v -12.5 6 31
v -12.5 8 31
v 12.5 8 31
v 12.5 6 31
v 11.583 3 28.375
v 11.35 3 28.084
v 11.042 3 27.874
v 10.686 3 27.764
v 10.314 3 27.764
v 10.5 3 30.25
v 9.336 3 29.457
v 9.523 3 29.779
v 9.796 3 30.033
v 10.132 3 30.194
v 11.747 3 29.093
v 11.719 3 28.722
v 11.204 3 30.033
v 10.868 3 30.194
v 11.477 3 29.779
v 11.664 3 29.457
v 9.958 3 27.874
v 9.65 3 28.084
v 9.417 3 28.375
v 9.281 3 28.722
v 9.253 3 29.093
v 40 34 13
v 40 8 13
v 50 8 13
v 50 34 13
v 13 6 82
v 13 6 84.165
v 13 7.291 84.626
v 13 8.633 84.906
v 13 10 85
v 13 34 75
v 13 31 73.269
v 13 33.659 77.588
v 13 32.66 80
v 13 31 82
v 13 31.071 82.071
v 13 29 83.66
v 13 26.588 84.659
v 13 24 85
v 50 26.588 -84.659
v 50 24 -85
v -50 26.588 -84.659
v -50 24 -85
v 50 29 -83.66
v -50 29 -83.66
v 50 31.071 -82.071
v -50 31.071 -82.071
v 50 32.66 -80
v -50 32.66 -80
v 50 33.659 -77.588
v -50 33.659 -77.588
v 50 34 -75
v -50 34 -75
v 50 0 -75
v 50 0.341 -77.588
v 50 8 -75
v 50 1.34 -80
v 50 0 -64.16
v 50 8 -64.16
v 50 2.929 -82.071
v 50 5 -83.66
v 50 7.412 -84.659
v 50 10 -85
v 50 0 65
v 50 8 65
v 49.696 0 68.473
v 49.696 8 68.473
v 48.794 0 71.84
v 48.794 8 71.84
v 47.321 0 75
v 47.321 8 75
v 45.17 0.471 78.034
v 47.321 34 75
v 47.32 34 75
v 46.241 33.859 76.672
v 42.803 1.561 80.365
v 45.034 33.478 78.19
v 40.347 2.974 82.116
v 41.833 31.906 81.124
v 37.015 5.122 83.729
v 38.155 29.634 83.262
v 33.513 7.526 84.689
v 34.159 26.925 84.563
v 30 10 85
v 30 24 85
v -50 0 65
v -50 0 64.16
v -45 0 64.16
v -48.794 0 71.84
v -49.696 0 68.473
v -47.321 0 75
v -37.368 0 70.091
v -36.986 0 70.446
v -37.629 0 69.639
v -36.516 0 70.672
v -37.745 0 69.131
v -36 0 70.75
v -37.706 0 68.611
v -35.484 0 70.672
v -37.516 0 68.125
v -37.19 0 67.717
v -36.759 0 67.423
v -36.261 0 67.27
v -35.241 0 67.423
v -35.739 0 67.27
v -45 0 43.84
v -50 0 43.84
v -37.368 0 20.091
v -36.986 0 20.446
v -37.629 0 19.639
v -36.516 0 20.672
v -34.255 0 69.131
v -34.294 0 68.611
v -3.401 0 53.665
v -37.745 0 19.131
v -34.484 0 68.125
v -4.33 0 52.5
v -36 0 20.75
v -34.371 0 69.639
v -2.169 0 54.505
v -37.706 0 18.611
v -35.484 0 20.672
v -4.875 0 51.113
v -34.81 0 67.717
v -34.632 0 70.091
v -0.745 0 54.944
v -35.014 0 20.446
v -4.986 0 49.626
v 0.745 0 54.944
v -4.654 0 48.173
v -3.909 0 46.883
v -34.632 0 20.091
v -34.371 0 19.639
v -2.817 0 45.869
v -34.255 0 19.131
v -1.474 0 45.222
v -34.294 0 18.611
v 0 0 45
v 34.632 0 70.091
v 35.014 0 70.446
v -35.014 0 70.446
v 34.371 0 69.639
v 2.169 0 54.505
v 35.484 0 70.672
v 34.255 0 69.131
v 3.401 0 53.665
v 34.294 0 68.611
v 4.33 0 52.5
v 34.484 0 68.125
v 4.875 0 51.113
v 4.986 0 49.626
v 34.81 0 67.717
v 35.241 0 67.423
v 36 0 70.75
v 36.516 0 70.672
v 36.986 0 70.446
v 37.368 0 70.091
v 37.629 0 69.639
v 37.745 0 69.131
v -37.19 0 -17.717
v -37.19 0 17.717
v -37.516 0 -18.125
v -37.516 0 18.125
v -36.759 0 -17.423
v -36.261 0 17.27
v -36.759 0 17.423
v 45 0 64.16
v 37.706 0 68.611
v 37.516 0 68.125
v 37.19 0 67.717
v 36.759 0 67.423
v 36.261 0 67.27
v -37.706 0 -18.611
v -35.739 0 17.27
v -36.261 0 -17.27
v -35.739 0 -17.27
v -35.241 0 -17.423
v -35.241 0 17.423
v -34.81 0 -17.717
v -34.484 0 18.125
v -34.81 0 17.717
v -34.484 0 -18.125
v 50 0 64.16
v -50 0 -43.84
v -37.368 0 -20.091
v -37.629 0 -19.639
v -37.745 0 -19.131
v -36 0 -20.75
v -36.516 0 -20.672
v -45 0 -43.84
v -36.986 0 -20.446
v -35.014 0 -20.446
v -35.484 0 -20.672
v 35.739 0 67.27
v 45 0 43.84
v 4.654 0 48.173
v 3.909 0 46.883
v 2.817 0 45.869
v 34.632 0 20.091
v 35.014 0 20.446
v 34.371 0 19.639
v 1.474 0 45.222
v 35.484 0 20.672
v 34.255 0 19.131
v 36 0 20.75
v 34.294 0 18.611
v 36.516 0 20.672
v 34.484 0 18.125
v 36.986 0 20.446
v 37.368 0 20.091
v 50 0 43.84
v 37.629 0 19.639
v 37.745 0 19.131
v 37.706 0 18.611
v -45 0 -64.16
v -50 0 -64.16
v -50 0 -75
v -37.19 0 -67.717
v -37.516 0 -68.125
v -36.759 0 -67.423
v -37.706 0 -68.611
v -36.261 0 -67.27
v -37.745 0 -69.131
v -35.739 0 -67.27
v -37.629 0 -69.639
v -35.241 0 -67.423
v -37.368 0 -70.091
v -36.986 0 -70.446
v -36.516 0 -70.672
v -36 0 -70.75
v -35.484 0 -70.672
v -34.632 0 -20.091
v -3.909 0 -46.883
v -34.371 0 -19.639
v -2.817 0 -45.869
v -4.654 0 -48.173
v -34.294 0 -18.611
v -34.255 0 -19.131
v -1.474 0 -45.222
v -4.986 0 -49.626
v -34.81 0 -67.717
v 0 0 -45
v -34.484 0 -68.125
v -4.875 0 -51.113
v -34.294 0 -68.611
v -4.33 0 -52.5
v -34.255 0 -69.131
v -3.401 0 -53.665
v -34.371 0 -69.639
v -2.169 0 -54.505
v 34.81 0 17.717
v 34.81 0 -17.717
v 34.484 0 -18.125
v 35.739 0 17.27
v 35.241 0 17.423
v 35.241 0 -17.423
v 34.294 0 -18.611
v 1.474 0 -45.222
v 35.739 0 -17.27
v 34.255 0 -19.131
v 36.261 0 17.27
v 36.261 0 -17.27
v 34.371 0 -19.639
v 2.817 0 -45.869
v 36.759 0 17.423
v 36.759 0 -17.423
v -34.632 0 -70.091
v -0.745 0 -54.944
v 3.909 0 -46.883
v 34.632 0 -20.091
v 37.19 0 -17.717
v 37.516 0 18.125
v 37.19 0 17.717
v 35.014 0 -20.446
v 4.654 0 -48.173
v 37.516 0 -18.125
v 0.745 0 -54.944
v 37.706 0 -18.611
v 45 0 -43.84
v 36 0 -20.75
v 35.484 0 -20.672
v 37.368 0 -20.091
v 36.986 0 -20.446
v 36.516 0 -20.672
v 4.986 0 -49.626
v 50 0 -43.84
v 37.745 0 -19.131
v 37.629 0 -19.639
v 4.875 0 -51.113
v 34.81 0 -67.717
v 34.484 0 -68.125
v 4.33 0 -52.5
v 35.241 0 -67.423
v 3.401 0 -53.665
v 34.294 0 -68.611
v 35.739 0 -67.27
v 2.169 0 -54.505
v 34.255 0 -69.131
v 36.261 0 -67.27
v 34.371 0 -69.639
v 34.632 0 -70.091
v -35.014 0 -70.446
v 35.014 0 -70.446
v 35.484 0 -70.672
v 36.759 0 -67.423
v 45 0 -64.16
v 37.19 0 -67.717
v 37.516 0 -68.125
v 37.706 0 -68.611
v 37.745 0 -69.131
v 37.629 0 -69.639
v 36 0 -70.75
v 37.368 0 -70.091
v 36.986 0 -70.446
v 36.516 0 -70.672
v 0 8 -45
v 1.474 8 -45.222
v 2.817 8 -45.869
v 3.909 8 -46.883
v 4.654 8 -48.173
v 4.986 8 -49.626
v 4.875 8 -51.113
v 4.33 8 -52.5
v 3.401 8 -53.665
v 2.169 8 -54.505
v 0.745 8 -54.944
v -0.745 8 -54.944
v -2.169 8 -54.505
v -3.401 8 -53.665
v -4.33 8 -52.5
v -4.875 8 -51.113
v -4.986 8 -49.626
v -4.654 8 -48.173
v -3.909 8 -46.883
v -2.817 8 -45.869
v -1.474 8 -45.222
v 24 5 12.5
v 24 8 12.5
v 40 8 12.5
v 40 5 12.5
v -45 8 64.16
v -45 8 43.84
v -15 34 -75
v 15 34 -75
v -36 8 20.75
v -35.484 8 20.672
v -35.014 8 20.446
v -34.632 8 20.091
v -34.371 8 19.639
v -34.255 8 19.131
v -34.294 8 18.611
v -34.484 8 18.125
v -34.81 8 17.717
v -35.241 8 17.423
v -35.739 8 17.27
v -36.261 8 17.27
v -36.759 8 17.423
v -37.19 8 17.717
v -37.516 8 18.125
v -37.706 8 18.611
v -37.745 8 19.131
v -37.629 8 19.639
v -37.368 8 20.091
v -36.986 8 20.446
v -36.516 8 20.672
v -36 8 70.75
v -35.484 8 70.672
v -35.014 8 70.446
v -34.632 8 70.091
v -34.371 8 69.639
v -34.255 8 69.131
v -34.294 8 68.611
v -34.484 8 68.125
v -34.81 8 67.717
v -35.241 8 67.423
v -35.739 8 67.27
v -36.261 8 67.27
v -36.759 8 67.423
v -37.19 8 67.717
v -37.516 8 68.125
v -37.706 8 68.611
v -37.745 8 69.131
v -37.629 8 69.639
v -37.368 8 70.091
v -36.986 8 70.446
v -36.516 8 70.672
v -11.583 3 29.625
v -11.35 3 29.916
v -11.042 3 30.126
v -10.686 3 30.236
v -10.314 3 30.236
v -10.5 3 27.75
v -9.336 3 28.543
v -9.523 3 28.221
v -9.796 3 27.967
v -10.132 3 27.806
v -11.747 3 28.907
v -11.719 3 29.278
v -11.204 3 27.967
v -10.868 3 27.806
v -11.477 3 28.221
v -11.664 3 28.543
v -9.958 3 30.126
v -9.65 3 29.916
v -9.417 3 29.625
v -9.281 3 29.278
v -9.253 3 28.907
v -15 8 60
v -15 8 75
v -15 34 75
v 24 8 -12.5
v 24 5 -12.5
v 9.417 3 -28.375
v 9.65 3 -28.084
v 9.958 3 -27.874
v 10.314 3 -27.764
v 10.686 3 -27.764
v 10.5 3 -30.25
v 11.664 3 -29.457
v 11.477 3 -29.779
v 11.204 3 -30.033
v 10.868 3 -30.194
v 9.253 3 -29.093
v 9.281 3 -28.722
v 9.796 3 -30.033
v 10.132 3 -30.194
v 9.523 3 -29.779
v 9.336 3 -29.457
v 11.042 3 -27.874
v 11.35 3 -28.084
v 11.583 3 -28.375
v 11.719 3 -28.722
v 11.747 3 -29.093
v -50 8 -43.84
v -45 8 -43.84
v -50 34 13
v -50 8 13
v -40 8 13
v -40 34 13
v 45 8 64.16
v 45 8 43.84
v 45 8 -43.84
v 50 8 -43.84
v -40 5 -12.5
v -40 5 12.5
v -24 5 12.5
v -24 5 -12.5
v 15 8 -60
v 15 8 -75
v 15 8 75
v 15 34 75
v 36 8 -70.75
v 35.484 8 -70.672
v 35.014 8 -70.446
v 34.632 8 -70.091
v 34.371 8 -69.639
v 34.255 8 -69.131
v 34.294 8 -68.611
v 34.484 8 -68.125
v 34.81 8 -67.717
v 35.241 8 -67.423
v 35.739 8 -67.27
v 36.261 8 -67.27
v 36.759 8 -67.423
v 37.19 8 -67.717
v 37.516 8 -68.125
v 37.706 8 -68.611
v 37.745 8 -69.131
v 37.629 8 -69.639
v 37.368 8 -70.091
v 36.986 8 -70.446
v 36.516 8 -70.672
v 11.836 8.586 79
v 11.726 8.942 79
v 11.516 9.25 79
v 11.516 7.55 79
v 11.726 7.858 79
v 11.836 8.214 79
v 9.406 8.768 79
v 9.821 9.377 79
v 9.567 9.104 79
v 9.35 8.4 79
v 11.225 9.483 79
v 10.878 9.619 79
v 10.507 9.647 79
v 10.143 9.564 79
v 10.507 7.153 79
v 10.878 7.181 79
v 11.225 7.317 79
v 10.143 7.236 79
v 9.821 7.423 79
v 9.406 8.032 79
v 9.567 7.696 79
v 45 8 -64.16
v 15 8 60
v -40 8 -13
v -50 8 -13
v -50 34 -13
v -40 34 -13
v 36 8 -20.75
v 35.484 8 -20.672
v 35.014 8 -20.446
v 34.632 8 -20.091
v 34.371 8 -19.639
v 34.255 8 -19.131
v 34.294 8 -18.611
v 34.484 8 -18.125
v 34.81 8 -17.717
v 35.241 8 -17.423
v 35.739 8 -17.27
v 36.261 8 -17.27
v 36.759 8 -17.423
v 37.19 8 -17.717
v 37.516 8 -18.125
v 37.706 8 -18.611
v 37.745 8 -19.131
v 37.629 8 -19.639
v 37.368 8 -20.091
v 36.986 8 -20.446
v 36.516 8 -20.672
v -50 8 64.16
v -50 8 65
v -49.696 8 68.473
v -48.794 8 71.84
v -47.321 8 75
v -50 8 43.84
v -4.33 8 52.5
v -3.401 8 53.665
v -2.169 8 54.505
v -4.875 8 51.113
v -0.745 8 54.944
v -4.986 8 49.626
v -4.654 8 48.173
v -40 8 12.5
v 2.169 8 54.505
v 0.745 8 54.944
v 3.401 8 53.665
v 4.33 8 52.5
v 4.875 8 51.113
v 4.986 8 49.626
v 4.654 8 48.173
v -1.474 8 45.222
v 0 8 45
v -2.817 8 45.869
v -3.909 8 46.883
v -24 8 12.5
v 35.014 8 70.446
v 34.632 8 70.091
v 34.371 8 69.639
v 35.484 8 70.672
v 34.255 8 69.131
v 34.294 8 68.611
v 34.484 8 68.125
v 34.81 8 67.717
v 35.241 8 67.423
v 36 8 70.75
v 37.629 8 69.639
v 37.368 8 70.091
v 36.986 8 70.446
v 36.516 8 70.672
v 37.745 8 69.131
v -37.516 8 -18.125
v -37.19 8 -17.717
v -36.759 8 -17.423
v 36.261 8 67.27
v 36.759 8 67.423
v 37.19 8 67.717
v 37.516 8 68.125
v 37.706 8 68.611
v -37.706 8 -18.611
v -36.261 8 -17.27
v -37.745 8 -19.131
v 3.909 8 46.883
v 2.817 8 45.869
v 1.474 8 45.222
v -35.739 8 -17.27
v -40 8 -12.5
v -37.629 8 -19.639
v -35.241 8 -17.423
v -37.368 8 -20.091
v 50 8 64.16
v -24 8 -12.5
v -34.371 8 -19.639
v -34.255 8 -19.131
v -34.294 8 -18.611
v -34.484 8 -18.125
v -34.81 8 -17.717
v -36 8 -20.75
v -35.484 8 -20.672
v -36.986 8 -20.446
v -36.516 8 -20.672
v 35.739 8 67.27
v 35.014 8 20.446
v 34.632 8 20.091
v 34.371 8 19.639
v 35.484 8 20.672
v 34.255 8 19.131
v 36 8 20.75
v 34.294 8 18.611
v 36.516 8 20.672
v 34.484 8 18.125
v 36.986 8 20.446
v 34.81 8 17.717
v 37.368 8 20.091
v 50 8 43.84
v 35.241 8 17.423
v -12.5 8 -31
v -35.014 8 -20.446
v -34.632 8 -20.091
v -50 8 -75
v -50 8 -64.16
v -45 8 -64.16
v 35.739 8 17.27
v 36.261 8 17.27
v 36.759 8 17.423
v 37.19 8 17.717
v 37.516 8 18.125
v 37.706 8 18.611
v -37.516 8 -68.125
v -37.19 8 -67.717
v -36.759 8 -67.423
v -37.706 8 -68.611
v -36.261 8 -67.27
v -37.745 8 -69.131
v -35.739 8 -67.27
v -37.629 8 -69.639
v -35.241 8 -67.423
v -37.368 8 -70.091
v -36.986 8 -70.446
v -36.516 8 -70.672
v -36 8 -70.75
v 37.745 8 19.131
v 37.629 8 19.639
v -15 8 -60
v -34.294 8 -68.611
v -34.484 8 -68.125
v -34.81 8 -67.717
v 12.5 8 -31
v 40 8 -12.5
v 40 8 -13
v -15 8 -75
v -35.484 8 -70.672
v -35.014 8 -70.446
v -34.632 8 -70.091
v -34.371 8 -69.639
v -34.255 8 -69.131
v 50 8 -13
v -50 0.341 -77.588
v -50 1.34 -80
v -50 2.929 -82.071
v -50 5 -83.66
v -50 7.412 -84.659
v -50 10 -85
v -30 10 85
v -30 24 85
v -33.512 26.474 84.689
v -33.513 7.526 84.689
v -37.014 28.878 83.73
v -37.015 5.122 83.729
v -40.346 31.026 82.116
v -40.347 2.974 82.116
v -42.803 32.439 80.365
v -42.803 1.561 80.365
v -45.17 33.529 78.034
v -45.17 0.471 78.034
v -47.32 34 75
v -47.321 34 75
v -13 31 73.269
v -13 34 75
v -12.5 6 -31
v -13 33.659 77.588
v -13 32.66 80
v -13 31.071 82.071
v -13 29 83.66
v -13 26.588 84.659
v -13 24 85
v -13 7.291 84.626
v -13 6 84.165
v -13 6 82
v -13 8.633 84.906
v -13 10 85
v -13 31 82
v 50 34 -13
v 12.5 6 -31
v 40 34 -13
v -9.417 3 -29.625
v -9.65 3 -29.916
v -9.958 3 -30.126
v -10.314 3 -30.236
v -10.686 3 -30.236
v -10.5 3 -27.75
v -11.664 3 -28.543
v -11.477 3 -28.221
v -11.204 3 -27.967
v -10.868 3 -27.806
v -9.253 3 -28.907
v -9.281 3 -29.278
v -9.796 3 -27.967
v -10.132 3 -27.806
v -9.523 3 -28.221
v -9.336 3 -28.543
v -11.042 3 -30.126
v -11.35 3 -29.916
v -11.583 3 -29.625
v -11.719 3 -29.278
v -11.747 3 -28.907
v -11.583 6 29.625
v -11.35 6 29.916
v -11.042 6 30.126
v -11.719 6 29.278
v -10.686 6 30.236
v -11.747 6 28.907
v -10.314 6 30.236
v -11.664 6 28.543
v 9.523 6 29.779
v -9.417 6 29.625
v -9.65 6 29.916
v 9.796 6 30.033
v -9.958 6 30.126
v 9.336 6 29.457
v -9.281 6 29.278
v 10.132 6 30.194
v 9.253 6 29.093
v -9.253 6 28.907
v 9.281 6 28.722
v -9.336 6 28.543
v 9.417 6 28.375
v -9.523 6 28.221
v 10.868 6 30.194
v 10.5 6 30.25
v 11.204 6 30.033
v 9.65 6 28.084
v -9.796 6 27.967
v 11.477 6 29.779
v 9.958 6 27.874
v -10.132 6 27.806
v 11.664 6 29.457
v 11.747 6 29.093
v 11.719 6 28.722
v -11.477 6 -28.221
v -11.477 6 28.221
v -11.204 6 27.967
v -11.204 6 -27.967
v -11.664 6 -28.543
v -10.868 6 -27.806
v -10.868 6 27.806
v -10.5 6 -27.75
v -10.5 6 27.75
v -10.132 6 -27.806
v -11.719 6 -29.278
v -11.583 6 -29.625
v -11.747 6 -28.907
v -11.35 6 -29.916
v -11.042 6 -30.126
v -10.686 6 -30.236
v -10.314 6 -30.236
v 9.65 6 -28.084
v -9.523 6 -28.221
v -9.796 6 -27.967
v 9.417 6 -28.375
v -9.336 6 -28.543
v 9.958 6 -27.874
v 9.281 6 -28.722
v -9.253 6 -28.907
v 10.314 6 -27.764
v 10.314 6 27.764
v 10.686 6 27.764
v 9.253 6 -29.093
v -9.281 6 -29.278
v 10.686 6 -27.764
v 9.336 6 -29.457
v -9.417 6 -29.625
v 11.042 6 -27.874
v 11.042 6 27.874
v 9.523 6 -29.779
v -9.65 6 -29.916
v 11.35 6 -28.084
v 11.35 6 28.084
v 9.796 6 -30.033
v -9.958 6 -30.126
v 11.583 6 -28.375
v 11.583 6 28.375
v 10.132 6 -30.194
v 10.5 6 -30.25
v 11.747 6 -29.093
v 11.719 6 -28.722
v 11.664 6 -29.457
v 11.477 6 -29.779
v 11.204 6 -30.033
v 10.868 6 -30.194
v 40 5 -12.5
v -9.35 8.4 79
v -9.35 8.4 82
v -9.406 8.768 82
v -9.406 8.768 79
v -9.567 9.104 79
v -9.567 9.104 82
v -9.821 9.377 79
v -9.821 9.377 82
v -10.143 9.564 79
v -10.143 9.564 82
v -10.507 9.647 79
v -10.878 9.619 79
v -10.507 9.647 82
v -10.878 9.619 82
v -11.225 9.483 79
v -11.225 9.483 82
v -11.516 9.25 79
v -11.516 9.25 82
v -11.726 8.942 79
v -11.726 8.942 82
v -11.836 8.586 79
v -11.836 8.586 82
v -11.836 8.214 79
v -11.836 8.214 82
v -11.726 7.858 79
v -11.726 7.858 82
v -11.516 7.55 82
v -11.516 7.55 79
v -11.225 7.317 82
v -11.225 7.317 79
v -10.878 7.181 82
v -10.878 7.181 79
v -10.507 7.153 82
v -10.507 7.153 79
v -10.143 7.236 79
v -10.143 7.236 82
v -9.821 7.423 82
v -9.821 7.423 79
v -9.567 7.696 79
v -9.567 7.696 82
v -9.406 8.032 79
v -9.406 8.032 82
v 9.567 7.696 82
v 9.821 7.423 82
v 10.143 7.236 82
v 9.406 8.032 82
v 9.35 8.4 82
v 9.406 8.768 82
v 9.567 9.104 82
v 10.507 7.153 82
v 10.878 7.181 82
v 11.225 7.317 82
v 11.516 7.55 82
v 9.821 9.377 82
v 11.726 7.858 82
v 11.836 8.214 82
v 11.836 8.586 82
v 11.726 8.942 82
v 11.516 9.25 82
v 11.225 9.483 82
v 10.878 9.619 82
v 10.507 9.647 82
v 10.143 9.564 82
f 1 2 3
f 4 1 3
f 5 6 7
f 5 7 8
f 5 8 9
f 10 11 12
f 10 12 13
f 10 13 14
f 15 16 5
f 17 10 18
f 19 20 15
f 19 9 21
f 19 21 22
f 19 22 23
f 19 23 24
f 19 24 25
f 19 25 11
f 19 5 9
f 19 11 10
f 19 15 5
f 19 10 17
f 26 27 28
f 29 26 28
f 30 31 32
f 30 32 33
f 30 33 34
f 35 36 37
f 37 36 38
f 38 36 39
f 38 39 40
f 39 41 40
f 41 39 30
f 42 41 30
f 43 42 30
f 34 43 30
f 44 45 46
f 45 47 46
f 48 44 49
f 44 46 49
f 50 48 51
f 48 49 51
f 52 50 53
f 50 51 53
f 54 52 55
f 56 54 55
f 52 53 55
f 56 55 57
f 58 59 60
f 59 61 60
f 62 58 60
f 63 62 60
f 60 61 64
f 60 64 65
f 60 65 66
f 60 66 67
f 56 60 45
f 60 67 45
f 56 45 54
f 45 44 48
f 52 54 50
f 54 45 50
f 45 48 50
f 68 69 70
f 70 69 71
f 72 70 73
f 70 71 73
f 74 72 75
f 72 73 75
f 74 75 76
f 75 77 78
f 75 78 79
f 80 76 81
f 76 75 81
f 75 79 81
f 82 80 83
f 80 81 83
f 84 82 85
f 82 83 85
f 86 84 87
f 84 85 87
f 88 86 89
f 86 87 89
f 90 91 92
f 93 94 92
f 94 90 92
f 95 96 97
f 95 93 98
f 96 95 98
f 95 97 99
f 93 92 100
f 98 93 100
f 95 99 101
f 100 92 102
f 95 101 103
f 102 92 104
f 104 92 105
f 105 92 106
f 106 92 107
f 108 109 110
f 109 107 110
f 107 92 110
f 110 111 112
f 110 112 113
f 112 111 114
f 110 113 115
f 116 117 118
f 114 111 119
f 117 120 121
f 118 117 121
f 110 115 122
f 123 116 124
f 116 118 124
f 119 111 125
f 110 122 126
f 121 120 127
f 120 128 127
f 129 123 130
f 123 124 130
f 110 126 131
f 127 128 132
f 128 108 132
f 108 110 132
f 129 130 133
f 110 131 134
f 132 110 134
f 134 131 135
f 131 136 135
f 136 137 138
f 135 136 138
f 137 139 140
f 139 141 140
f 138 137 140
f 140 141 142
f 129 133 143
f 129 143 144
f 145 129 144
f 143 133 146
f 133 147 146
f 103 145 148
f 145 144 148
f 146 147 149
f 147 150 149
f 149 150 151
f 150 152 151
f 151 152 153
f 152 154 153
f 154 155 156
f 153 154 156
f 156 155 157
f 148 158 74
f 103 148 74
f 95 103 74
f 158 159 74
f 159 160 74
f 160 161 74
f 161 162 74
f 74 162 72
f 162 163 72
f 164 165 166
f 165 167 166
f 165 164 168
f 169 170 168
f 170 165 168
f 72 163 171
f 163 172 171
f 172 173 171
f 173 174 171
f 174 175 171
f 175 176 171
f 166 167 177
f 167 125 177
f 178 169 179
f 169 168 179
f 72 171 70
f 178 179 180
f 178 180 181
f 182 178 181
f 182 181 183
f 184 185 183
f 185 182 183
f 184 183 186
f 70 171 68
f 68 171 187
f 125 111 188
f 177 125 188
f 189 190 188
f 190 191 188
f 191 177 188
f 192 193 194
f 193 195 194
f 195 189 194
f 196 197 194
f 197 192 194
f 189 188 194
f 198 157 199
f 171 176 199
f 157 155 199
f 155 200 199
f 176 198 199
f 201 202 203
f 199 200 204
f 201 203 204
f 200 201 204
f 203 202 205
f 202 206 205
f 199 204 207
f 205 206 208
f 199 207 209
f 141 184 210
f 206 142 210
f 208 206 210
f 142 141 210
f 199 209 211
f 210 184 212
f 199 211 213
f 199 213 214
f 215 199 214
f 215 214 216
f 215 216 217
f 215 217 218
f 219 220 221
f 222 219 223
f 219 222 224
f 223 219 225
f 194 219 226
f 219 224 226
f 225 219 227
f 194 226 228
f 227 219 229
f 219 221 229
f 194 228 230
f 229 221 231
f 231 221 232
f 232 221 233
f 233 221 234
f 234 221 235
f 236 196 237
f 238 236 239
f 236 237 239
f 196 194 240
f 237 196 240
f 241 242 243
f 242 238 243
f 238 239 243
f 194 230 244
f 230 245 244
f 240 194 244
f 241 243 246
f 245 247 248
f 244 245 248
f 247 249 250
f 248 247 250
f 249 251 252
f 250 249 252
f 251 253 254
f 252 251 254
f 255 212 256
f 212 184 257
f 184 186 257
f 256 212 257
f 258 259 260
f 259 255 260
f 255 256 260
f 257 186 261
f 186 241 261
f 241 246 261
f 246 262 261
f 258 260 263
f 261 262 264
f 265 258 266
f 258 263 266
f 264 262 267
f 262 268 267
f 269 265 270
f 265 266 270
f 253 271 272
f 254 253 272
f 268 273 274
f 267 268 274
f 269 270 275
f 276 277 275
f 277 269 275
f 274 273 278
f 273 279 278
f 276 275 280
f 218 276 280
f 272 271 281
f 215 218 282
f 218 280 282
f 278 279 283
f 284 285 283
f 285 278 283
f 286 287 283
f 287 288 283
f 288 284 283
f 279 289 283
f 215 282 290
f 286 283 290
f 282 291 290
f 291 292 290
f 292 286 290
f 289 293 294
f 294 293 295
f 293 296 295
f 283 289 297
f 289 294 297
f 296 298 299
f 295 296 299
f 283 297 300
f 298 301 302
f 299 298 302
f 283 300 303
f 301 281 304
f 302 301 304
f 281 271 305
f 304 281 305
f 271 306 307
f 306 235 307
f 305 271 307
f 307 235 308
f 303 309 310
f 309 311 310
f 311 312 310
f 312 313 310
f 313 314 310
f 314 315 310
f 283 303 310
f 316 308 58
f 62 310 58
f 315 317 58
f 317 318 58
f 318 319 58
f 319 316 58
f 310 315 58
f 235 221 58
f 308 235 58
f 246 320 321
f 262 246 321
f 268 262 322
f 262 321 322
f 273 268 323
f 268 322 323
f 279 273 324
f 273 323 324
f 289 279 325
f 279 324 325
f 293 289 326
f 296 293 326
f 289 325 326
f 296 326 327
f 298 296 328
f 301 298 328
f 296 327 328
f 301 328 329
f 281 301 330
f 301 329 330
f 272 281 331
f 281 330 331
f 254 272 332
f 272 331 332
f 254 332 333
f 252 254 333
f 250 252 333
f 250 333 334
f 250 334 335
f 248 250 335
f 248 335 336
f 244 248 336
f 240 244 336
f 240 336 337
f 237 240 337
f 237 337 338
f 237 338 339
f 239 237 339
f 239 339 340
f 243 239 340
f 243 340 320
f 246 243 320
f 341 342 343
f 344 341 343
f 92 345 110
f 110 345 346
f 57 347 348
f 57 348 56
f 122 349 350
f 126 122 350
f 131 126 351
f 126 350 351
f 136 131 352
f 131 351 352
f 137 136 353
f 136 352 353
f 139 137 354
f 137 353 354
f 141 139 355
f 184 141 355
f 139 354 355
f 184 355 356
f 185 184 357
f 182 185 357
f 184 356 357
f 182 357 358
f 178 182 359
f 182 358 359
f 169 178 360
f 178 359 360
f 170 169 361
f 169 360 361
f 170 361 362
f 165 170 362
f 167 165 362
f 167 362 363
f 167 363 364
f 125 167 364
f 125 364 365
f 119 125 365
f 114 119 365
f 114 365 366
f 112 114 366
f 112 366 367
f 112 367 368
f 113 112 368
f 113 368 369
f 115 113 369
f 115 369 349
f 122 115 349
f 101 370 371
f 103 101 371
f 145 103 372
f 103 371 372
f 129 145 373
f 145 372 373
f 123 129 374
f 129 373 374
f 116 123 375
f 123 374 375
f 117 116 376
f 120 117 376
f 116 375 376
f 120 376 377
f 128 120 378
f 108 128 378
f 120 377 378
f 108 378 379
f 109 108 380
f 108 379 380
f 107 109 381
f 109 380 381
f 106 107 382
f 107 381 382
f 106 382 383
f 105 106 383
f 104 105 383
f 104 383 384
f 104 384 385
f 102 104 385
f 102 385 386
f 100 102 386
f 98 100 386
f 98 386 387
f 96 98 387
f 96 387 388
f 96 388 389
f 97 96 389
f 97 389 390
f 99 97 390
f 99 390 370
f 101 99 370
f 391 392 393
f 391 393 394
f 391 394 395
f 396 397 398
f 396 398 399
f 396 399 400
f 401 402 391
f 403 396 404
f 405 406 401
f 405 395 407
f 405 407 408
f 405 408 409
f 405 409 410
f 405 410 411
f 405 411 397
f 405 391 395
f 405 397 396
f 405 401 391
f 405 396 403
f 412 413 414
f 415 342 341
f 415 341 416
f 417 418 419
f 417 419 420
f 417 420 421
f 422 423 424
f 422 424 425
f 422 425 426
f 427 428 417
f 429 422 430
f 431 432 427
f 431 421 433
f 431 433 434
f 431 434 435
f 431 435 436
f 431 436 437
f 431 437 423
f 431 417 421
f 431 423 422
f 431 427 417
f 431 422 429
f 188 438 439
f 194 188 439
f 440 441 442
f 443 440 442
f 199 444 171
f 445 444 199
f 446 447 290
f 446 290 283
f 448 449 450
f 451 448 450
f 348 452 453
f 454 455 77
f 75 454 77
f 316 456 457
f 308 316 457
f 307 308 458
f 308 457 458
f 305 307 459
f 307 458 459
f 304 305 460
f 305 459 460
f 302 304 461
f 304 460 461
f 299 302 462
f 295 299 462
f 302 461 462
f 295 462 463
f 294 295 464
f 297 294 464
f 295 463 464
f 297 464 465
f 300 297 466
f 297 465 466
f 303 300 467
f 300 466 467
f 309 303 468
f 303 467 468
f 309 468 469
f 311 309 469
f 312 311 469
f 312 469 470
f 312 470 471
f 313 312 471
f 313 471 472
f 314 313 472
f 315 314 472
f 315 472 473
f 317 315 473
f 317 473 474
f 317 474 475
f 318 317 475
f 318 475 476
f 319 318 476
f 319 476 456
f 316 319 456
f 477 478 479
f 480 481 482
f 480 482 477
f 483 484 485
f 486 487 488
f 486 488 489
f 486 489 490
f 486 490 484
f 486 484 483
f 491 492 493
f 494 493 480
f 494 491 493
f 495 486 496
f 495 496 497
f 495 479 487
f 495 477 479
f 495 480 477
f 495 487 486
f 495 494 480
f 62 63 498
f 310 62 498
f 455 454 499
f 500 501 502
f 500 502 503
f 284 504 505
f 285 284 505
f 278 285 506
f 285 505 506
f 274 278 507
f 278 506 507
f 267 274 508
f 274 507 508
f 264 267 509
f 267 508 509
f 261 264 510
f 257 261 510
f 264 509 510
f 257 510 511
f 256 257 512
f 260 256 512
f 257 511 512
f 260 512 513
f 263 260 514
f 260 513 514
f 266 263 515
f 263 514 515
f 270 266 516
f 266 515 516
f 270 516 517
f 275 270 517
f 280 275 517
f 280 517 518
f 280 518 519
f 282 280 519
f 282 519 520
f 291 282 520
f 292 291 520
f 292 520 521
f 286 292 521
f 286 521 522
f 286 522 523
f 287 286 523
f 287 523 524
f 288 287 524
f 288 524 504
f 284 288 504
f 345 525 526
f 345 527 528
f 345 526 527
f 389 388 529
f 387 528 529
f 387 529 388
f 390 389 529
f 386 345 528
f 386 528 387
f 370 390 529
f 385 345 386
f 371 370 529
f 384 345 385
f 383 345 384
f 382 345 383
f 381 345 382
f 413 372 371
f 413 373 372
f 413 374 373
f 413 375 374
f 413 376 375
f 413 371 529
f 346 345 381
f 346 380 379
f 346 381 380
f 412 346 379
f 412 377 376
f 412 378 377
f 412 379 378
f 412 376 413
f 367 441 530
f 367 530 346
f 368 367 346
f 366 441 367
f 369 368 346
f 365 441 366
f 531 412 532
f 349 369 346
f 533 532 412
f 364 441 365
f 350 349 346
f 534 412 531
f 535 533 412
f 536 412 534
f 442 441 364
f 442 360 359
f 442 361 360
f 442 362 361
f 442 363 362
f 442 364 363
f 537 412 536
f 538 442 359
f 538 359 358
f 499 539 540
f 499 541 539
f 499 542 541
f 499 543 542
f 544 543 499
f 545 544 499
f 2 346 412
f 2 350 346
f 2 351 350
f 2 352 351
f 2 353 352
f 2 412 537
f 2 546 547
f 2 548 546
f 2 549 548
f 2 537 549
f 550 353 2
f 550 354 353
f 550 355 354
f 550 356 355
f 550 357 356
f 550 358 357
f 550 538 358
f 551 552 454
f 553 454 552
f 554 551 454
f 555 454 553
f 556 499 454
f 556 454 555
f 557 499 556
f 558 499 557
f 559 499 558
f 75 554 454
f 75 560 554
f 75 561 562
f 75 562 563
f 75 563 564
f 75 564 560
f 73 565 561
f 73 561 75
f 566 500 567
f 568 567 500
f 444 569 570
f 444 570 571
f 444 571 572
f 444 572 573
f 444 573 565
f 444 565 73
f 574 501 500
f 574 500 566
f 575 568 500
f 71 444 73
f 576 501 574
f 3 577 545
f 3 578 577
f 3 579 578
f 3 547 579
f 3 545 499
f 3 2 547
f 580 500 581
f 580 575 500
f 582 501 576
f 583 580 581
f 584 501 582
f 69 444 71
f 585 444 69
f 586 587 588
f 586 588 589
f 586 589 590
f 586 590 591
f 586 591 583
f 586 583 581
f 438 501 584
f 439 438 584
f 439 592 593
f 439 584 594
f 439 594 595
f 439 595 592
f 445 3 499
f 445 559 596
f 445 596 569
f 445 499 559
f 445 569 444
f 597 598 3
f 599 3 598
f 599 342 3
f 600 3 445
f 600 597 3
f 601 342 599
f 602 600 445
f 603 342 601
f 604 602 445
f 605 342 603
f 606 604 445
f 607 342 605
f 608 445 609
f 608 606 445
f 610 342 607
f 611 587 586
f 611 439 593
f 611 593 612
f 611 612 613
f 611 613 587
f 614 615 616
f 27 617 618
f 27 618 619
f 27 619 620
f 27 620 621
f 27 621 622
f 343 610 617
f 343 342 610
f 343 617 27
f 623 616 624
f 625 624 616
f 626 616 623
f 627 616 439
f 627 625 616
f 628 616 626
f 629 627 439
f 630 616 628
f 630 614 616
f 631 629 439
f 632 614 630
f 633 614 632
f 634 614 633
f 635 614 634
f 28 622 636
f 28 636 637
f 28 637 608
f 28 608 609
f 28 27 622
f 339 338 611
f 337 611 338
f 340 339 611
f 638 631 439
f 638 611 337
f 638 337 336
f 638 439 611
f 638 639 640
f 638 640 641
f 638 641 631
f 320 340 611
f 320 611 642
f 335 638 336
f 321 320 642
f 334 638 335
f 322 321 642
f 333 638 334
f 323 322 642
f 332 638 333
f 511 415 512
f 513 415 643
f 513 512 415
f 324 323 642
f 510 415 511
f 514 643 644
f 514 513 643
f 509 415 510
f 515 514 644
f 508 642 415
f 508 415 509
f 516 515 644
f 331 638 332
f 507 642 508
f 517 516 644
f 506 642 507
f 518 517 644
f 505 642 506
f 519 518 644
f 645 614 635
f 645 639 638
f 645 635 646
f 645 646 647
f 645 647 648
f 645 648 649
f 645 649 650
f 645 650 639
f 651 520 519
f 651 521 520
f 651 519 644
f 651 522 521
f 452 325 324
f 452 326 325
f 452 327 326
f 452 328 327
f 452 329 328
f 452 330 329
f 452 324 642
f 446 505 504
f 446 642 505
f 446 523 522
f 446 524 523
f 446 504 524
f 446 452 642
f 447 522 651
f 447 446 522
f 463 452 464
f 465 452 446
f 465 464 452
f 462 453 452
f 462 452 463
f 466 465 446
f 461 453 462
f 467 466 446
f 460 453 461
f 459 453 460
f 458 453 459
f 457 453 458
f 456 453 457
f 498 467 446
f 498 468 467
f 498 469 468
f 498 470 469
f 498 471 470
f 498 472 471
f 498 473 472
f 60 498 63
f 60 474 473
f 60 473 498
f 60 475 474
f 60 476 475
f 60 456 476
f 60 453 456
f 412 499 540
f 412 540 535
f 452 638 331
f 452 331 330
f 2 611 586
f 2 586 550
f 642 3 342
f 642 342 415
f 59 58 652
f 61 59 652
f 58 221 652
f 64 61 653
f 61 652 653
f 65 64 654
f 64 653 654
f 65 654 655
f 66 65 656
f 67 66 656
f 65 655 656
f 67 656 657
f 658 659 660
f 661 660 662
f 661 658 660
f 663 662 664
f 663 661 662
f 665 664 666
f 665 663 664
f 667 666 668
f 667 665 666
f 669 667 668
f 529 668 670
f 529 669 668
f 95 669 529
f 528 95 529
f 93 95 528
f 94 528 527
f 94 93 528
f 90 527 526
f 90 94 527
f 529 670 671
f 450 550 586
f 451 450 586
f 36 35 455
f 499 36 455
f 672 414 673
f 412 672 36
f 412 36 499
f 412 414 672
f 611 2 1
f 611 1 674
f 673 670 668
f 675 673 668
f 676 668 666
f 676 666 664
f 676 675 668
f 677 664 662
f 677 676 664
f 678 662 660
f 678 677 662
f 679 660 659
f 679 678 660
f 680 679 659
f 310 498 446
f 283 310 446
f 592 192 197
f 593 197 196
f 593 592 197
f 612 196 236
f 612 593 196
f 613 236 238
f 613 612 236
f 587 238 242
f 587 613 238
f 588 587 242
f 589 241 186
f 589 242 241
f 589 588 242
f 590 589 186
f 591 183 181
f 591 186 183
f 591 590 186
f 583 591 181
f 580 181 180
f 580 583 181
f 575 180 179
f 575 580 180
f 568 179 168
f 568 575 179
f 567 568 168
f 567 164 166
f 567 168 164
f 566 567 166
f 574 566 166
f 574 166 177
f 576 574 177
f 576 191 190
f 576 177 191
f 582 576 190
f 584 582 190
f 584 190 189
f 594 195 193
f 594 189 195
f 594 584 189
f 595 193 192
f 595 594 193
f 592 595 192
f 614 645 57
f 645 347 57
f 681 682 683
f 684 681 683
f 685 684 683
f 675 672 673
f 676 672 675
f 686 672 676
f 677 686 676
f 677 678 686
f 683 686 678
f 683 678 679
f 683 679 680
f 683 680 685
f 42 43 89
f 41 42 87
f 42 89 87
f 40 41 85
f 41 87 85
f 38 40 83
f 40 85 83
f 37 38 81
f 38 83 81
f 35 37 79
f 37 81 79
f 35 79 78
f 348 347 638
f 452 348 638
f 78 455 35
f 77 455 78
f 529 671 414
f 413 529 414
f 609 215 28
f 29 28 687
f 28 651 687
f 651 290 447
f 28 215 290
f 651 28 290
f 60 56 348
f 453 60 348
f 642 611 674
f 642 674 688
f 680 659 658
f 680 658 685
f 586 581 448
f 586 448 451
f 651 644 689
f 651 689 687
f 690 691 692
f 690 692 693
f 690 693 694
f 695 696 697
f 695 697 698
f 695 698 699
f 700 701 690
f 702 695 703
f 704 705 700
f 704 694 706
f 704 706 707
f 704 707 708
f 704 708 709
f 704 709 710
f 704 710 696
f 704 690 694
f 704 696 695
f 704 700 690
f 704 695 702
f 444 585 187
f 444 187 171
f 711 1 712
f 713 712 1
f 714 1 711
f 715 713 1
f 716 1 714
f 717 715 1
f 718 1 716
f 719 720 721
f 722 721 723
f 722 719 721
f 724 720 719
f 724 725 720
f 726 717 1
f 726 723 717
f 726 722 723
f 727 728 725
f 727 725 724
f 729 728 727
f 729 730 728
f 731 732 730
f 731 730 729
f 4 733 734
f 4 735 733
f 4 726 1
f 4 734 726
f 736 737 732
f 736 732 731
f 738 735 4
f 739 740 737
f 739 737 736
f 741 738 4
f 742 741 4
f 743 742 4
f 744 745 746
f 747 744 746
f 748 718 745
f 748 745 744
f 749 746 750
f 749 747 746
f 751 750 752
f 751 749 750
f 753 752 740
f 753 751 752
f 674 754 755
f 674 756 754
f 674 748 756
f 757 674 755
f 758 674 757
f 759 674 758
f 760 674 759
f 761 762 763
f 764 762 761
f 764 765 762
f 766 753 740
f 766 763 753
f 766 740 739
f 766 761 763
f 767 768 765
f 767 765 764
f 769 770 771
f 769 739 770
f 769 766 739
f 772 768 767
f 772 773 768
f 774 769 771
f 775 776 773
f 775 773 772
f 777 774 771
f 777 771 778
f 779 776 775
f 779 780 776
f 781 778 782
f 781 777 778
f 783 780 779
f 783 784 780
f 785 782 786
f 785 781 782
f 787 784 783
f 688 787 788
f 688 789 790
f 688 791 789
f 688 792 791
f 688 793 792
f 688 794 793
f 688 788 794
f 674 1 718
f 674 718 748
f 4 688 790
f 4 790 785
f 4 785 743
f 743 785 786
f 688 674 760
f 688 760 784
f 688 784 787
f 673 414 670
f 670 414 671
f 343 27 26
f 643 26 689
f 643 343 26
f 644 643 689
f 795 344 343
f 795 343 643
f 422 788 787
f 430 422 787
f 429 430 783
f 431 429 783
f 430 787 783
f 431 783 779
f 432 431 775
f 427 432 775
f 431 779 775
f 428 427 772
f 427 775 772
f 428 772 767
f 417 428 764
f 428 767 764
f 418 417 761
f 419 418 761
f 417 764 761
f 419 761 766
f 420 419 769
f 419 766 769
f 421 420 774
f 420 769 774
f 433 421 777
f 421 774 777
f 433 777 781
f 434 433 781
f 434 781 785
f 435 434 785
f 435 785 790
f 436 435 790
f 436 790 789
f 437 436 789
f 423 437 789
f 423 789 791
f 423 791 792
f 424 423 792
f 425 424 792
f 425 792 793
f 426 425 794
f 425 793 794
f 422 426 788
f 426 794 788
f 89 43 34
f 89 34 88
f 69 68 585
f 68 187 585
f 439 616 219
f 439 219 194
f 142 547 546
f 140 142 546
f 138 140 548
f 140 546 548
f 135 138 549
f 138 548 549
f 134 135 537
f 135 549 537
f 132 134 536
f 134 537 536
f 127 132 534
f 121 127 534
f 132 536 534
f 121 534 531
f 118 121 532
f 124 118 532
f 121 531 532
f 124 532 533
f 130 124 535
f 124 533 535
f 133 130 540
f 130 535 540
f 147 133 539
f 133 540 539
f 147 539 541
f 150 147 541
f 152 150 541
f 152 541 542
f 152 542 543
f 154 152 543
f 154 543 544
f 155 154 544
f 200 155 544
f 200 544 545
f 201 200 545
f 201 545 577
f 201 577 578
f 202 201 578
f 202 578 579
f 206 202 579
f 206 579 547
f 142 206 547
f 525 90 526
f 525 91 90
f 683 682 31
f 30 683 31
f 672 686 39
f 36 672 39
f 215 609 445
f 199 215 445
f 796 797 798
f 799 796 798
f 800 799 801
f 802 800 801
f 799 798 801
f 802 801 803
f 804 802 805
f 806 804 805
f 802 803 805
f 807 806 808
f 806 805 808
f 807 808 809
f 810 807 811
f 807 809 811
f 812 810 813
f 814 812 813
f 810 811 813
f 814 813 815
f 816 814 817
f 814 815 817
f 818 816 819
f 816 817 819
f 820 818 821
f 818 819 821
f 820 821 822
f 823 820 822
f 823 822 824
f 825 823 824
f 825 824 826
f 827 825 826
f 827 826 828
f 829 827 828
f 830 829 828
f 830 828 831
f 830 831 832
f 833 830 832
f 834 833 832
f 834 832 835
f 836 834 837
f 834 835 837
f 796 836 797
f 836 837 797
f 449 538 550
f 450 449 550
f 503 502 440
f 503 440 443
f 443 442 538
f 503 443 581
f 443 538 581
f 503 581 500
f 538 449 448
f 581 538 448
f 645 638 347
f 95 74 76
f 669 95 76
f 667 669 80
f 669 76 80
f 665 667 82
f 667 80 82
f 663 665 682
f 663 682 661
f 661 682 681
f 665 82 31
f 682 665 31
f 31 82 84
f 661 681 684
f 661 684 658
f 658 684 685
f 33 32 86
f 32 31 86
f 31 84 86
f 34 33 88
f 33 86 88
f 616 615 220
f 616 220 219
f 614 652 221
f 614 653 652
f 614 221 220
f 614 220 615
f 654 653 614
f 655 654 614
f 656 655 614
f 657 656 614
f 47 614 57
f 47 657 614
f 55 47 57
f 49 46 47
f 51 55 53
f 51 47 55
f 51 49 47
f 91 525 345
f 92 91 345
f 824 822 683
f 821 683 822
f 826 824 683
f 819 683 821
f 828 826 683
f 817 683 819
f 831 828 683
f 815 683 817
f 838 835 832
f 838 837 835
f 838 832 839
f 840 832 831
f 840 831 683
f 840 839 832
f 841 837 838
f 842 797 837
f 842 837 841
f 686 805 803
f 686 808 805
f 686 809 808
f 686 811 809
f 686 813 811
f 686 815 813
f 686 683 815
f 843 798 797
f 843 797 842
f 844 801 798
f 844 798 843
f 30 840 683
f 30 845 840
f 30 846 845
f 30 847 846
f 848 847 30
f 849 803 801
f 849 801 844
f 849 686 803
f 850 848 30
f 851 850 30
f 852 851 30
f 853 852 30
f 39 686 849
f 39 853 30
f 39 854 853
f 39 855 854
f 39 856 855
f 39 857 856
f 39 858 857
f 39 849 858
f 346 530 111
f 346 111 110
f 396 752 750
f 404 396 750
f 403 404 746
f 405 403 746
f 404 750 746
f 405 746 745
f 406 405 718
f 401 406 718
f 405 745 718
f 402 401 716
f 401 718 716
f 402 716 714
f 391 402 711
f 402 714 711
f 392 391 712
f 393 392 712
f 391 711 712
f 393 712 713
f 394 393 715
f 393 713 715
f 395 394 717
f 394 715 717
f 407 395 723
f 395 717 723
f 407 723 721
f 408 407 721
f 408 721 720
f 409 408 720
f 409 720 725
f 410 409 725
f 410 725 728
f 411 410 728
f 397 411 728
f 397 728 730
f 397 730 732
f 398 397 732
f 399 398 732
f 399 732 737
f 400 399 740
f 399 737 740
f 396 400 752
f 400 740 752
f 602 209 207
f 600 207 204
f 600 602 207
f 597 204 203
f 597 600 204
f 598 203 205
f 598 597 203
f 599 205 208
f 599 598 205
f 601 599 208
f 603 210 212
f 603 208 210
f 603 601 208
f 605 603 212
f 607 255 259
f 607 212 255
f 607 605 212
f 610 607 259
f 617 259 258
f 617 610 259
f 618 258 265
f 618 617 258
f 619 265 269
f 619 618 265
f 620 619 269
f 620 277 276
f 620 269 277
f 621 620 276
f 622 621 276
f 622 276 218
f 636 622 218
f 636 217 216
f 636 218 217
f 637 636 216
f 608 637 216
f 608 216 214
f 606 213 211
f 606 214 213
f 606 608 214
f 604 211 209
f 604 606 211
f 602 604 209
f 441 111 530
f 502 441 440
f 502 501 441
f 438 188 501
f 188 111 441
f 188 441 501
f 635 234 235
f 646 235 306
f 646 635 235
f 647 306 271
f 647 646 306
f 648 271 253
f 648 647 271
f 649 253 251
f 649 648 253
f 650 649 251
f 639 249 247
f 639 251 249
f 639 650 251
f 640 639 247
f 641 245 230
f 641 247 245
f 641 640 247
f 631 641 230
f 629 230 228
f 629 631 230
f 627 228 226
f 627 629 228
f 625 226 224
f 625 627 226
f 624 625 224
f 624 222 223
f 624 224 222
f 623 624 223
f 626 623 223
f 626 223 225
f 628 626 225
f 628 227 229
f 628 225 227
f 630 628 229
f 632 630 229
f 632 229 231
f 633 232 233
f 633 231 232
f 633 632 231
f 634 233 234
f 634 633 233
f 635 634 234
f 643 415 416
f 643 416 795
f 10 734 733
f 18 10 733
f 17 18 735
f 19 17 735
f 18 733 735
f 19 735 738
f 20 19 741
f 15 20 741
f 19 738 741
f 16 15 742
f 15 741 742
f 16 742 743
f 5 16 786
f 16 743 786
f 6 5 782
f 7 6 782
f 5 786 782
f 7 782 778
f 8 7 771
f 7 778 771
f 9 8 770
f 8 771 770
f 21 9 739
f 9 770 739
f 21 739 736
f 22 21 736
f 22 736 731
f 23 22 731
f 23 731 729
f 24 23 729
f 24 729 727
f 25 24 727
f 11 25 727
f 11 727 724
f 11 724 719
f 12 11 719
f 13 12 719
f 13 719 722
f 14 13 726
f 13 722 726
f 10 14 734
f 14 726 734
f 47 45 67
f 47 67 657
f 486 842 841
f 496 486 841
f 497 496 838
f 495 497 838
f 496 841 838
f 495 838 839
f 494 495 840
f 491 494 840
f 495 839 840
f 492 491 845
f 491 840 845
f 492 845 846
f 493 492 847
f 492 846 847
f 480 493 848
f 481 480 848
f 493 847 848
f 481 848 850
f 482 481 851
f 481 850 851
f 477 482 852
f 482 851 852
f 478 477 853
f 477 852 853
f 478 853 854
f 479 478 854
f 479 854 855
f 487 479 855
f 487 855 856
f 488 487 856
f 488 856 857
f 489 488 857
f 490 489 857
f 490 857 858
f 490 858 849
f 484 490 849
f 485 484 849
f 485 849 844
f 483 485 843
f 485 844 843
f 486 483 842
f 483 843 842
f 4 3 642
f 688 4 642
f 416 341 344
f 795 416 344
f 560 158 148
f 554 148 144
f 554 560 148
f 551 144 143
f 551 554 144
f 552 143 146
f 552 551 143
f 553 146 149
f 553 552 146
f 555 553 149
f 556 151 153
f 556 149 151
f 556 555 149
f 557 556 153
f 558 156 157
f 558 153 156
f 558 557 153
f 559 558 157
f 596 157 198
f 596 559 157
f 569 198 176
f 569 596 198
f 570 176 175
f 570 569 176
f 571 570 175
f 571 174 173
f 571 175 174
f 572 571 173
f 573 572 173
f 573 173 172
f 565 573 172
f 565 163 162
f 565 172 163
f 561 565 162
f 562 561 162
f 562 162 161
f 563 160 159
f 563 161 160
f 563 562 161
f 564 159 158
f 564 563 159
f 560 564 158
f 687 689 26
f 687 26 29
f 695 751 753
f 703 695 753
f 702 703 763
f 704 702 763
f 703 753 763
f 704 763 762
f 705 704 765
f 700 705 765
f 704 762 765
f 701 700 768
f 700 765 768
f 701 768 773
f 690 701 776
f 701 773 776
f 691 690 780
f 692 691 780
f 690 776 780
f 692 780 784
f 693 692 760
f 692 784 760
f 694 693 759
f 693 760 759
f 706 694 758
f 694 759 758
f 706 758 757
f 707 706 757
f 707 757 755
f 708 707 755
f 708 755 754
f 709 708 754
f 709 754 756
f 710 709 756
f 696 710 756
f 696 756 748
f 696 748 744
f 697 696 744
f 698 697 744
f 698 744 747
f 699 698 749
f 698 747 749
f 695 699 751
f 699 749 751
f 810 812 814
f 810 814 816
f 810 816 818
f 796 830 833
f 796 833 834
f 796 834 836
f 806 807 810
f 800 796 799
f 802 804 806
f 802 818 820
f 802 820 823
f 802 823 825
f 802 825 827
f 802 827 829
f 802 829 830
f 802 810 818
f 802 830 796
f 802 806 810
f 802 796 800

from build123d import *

# Parameters (mm, degrees)
SKETCH_1_W               = 100
SKETCH_1_H               = 150
EXTRUDE_2_DEPTH          = 8
SKETCH_3_R               = 1.75
CUT_EXTRUDE_1_DEPTH      = 91.493093659
MIRROR_2_COPY_1_SKETCH_R = 1.75
MIRROR_2_COPY_1_DEPTH    = 91.493093659
SKETCH_4_W               = 25
SKETCH_4_H               = 62
CUT_EXTRUDE_2_DEPTH      = 2
SKETCH_6_R               = 1.25
CUT_EXTRUDE_3_DEPTH      = 3
SKETCH_7_W               = 10
SKETCH_7_H               = 26
EXTRUDE_3_DEPTH          = 26
SKETCH_8_W               = 30
SKETCH_8_H               = 15
EXTRUDE_4_DEPTH          = 26
SKETCH_9_W               = 16
SKETCH_9_H               = 25
CUT_EXTRUDE_4_DEPTH      = 3
SKETCH_11_W              = 100
SKETCH_11_H              = 34
EXTRUDE_5_DEPTH          = 10
SKETCH_12_W              = 100
SKETCH_12_H              = 34
EXTRUDE_6_DEPTH          = 10
SKETCH_13_W              = 26
SKETCH_13_H              = 28
CUT_EXTRUDE_5_DEPTH      = 3
CUT_EXTRUDE_6_REACH      = 179.609
SKETCH_14_W              = 26
SKETCH_14_H              = 6
CUT_EXTRUDE_7_REACH      = 114.276
CUT_EXTRUDE_8_REACH      = 114.276
SKETCH_19_R              = 1.25
CUT_EXTRUDE_9_DEPTH      = 3
SKETCH_20_W              = 5
SKETCH_20_H              = 20.32
CUT_EXTRUDE_10_DEPTH     = 10
MIRROR_4_COPY_1_SKETCH_W = 5
MIRROR_4_COPY_1_SKETCH_H = 20.32
MIRROR_4_COPY_1_DEPTH    = 10
FILLET_1_R               = 10
FILLET_2_R               = 10
FILLET_3_R               = 20
FILLET_START             = -1
FILLET_4_DEPTH           = 36
FILLET_5_R               = 10
SKETCH_21_R              = 5
CUT_EXTRUDE_11_DEPTH     = 102.985293215


with BuildPart() as part:
    # 草图1 → 凸台-拉伸2 (new body)
    with BuildSketch(Plane(origin=(0, 0, 0), x_dir=(1, 0, 0), z_dir=(0, 1, 0))):
        Rectangle(SKETCH_1_W, SKETCH_1_H)
    extrude(amount=EXTRUDE_2_DEPTH)

    # 草图3 → 切除-拉伸1 (cut, through all)
    with BuildSketch(Plane(origin=(0, 8, 0), x_dir=(1, 0, 0), z_dir=(0, 1, 0))):
        with Locations(Location((-36, -19, 0), (0, 0, 270))):
            Circle(SKETCH_3_R)
        with Locations(Location((-36, -69, 0), (0, 0, 270))):
            Circle(SKETCH_3_R)
    cut_extrude_1 = extrude(amount=-CUT_EXTRUDE_1_DEPTH, mode=Mode.SUBTRACT)

    # 镜向1: 切除-拉伸1 across plane
    add(cut_extrude_1.mirror(Plane(origin=(0, 0, 0), x_dir=(0, 0, 1), z_dir=(1, 0, 0))), mode=Mode.SUBTRACT)

    # 镜向2: 切除-拉伸1 across plane
    add(cut_extrude_1.mirror(Plane.XY), mode=Mode.SUBTRACT)

    # 镜向2 copy 1 sketch → 镜向2 copy 1 (cut, through all)
    with BuildSketch(Plane(origin=(0, 8, 0), x_dir=(-1, 0, 0), z_dir=(0, 1, 0))):
        with Locations(Location((-36, -19, 0), (0, 0, 270))):
            Circle(MIRROR_2_COPY_1_SKETCH_R)
        with Locations(Location((-36, -69, 0), (0, 0, 270))):
            Circle(MIRROR_2_COPY_1_SKETCH_R)
    extrude(amount=-MIRROR_2_COPY_1_DEPTH, mode=Mode.SUBTRACT)

    # 草图4 → 切除-拉伸2 (cut)
    with BuildSketch(Plane(origin=(0, 8, 0), x_dir=(1, 0, 0), z_dir=(0, 1, 0))):
        Rectangle(SKETCH_4_W, SKETCH_4_H)
    extrude(amount=-CUT_EXTRUDE_2_DEPTH, mode=Mode.SUBTRACT)

    # 草图6 → 切除-拉伸3 (cut)
    with BuildSketch(Plane(origin=(0, 6, 0), x_dir=(1, 0, 0), z_dir=(0, 1, 0))):
        with Locations(Location((-10.5, 29, 0), (0, 0, 270))):
            Circle(SKETCH_6_R)
        with Locations(Location((10.5, 29, 0), (0, 0, 90))):
            Circle(SKETCH_6_R)
        with Locations(Location((10.5, -29, 0), (0, 0, 270))):
            Circle(SKETCH_6_R)
        with Locations(Location((-10.5, -29, 0), (0, 0, 90))):
            Circle(SKETCH_6_R)
    extrude(amount=-CUT_EXTRUDE_3_DEPTH, mode=Mode.SUBTRACT)

    # 草图7 → 凸台-拉伸3 (add)
    with BuildSketch(Plane(origin=(0, 8, 0), x_dir=(1, 0, 0), z_dir=(0, 1, 0))):
        with Locations((-45, 0)):
            Rectangle(SKETCH_7_W, SKETCH_7_H)
        with Locations((45, 0)):
            Rectangle(SKETCH_7_W, SKETCH_7_H)
    extrude(amount=EXTRUDE_3_DEPTH)

    # 草图8 → 凸台-拉伸4 (add)
    with BuildSketch(Plane(origin=(0, 8, 0), x_dir=(1, 0, 0), z_dir=(0, 1, 0))):
        with Locations((0, 67.5)):
            Rectangle(SKETCH_8_W, SKETCH_8_H)
        with Locations((0, -67.5)):
            Rectangle(SKETCH_8_W, SKETCH_8_H)
    extrude(amount=EXTRUDE_4_DEPTH)

    # 草图9 → 切除-拉伸4 (cut)
    with BuildSketch(Plane(origin=(0, 8, 0), x_dir=(1, 0, 0), z_dir=(0, 1, 0))):
        with Locations((-32, 0)):
            Rectangle(SKETCH_9_W, SKETCH_9_H)
        with Locations((32, 0)):
            Rectangle(SKETCH_9_W, SKETCH_9_H)
    extrude(amount=-CUT_EXTRUDE_4_DEPTH, mode=Mode.SUBTRACT)

    # 草图11 → 凸台-拉伸5 (add)
    with BuildSketch(Plane(origin=(0, 0, -75), x_dir=(-1, 0, 0), z_dir=(0, 0, -1))):
        with Locations((0, 17)):
            Rectangle(SKETCH_11_W, SKETCH_11_H)
    extrude(amount=EXTRUDE_5_DEPTH)

    # 草图12 → 凸台-拉伸6 (add)
    with BuildSketch(Plane.XY.offset(75)):
        with Locations((0, 17)):
            Rectangle(SKETCH_12_W, SKETCH_12_H)
    extrude(amount=EXTRUDE_6_DEPTH)

    # 草图13 → 切除-拉伸5 (cut)
    with BuildSketch(Plane.XY.offset(85)):
        with Locations((0, 20)):
            Rectangle(SKETCH_13_W, SKETCH_13_H)
    extrude(amount=-CUT_EXTRUDE_5_DEPTH, mode=Mode.SUBTRACT)

    # 草图14 → 切除-拉伸6 (cut, up to next)
    with BuildSketch(Plane.XY.offset(82), mode=Mode.PRIVATE) as cut_extrude_6_sk1:
        with Locations((0, 34)):
            Rectangle(SKETCH_14_W, SKETCH_14_H)
    cut_extrude_6_tool1 = extrude(cut_extrude_6_sk1.sketch, amount=-CUT_EXTRUDE_6_REACH, mode=Mode.PRIVATE) & part.part
    add(cut_extrude_6_tool1.solids().sort_by_distance((0, 34, 82))[0], mode=Mode.SUBTRACT)

    # 草图17 → 切除-拉伸7 (cut, up to next)
    with BuildSketch(Plane.ZY.offset(15), mode=Mode.PRIVATE) as cut_extrude_7_sk1:
        Polygon((75, 34), (60, 8), (60, 34), align=None)
    cut_extrude_7_tool1 = extrude(cut_extrude_7_sk1.sketch, amount=-CUT_EXTRUDE_7_REACH, mode=Mode.PRIVATE) & part.part
    add(cut_extrude_7_tool1.solids().sort_by_distance((-15, 25.333333, 65))[0], mode=Mode.SUBTRACT)

    # 草图18 → 切除-拉伸8 (cut, up to next)
    with BuildSketch(Plane.ZY.offset(15), mode=Mode.PRIVATE) as cut_extrude_8_sk1:
        Polygon((-75, 34), (-60, 8), (-60, 34), align=None)
    cut_extrude_8_tool1 = extrude(cut_extrude_8_sk1.sketch, amount=-CUT_EXTRUDE_8_REACH, mode=Mode.PRIVATE) & part.part
    add(cut_extrude_8_tool1.solids().sort_by_distance((-15, 25.333333, -65))[0], mode=Mode.SUBTRACT)

    # 草图19 → 切除-拉伸9 (cut)
    with BuildSketch(Plane.XY.offset(82)):
        with Locations((-10.6, 8.4)):
            Circle(SKETCH_19_R)
        with Locations(Location((10.6, 8.4, 0), (0, 0, 180))):
            Circle(SKETCH_19_R)
    extrude(amount=-CUT_EXTRUDE_9_DEPTH, mode=Mode.SUBTRACT)

    # 草图20 → 切除-拉伸10 (cut)
    with BuildSketch(Plane(origin=(0, 8, 0), x_dir=(1, 0, 0), z_dir=(0, 1, 0))):
        with Locations((-47.5, -54)):
            Rectangle(SKETCH_20_W, SKETCH_20_H)
    cut_extrude_10 = extrude(amount=-CUT_EXTRUDE_10_DEPTH, mode=Mode.SUBTRACT)

    # 镜向3: 切除-拉伸10 across plane
    add(cut_extrude_10.mirror(Plane.XY), mode=Mode.SUBTRACT)

    # 镜向4: 切除-拉伸10 across plane
    add(cut_extrude_10.mirror(Plane(origin=(0, 0, 0), x_dir=(0, 0, 1), z_dir=(1, 0, 0))), mode=Mode.SUBTRACT)

    # 镜向4 copy 1 sketch → 镜向4 copy 1 (cut)
    with BuildSketch(Plane(origin=(0, 8, 0), x_dir=(-1, 0, 0), z_dir=(0, 1, 0))):
        with Locations((-47.5, -54)):
            Rectangle(MIRROR_4_COPY_1_SKETCH_W, MIRROR_4_COPY_1_SKETCH_H)
    extrude(amount=-MIRROR_4_COPY_1_DEPTH, mode=Mode.SUBTRACT)

    # 圆角1
    # the kernel refuses this fillet: 10 mm, written as the material it takes off along each edge
    with BuildSketch(Plane(origin=(75, 0, 85), x_dir=(0, 0, -1), z_dir=(-1, 0, 0))) as fillet_1_piece_1:
        with BuildLine():
            CenterArc((FILLET_1_R, -FILLET_1_R), FILLET_1_R, 90, 90)
            Line((0, -FILLET_1_R), (0, 0))
            Line((0, 0), (FILLET_1_R, 0))
        make_face()
    extrude(amount=150, mode=Mode.SUBTRACT)

    # 圆角2
    fillet_2_edges = [part.edges().sort_by_distance(p)[0] for p in [
        (31.5, 34, 85),
        (-31.5, 34, 85),
    ]]
    fillet(fillet_2_edges, radius=FILLET_2_R - 0.0001)  # a hair under: the kernel refuses the full size

    # 圆角3
    # the kernel refuses this fillet: 20 mm, written as the material it takes off along each edge
    with BuildSketch(Plane(origin=(50, 74.0001, 85), x_dir=(0, 0, -1), z_dir=(0, -1, 0))) as fillet_3_piece_1:
        with BuildLine():
            CenterArc((FILLET_3_R, -FILLET_3_R), FILLET_3_R, 90, 90)
            Line((0, -FILLET_3_R), (0, 0))
            Line((0, 0), (FILLET_3_R, 0))
        make_face()
    extrude(amount=114.0001, mode=Mode.SUBTRACT)

    # 圆角4: read off the stored shape, not the designer's step
    # 圆角4 outline → 圆角4 (cut)
    with BuildSketch(Plane(origin=(0, 0, 0), x_dir=(1, 0, 0), z_dir=(0, 1, 0)).offset(FILLET_START)):
        with BuildLine():
            ThreePointArc((-30, -85), (-44.142135624, -79.142135624), (-50, -65))
            Line((-50, -65), (-50, -85))
            Line((-50, -85), (-30, -85))
        make_face()
    extrude(amount=FILLET_4_DEPTH, mode=Mode.SUBTRACT)

    # 圆角5
    fillet_5_edges = [part.edges().sort_by_distance(p)[0] for p in [
        (0, 0, -85),
        (0, 34, -85),
    ]]
    fillet(fillet_5_edges, radius=FILLET_5_R - 0.0001)  # a hair under: the kernel refuses the full size

    # 草图21 → 切除-拉伸11 (cut, through all)
    with BuildSketch(Plane(origin=(0, 8, 0), x_dir=(1, 0, 0), z_dir=(0, 1, 0))):
        with Locations(Location((0, 50, 0), (0, 0, 270))):
            Circle(SKETCH_21_R)
        with Locations(Location((0, -50, 0), (0, 0, 90))):
            Circle(SKETCH_21_R)
    extrude(amount=-CUT_EXTRUDE_11_DEPTH, mode=Mode.SUBTRACT)


solid = part.part
